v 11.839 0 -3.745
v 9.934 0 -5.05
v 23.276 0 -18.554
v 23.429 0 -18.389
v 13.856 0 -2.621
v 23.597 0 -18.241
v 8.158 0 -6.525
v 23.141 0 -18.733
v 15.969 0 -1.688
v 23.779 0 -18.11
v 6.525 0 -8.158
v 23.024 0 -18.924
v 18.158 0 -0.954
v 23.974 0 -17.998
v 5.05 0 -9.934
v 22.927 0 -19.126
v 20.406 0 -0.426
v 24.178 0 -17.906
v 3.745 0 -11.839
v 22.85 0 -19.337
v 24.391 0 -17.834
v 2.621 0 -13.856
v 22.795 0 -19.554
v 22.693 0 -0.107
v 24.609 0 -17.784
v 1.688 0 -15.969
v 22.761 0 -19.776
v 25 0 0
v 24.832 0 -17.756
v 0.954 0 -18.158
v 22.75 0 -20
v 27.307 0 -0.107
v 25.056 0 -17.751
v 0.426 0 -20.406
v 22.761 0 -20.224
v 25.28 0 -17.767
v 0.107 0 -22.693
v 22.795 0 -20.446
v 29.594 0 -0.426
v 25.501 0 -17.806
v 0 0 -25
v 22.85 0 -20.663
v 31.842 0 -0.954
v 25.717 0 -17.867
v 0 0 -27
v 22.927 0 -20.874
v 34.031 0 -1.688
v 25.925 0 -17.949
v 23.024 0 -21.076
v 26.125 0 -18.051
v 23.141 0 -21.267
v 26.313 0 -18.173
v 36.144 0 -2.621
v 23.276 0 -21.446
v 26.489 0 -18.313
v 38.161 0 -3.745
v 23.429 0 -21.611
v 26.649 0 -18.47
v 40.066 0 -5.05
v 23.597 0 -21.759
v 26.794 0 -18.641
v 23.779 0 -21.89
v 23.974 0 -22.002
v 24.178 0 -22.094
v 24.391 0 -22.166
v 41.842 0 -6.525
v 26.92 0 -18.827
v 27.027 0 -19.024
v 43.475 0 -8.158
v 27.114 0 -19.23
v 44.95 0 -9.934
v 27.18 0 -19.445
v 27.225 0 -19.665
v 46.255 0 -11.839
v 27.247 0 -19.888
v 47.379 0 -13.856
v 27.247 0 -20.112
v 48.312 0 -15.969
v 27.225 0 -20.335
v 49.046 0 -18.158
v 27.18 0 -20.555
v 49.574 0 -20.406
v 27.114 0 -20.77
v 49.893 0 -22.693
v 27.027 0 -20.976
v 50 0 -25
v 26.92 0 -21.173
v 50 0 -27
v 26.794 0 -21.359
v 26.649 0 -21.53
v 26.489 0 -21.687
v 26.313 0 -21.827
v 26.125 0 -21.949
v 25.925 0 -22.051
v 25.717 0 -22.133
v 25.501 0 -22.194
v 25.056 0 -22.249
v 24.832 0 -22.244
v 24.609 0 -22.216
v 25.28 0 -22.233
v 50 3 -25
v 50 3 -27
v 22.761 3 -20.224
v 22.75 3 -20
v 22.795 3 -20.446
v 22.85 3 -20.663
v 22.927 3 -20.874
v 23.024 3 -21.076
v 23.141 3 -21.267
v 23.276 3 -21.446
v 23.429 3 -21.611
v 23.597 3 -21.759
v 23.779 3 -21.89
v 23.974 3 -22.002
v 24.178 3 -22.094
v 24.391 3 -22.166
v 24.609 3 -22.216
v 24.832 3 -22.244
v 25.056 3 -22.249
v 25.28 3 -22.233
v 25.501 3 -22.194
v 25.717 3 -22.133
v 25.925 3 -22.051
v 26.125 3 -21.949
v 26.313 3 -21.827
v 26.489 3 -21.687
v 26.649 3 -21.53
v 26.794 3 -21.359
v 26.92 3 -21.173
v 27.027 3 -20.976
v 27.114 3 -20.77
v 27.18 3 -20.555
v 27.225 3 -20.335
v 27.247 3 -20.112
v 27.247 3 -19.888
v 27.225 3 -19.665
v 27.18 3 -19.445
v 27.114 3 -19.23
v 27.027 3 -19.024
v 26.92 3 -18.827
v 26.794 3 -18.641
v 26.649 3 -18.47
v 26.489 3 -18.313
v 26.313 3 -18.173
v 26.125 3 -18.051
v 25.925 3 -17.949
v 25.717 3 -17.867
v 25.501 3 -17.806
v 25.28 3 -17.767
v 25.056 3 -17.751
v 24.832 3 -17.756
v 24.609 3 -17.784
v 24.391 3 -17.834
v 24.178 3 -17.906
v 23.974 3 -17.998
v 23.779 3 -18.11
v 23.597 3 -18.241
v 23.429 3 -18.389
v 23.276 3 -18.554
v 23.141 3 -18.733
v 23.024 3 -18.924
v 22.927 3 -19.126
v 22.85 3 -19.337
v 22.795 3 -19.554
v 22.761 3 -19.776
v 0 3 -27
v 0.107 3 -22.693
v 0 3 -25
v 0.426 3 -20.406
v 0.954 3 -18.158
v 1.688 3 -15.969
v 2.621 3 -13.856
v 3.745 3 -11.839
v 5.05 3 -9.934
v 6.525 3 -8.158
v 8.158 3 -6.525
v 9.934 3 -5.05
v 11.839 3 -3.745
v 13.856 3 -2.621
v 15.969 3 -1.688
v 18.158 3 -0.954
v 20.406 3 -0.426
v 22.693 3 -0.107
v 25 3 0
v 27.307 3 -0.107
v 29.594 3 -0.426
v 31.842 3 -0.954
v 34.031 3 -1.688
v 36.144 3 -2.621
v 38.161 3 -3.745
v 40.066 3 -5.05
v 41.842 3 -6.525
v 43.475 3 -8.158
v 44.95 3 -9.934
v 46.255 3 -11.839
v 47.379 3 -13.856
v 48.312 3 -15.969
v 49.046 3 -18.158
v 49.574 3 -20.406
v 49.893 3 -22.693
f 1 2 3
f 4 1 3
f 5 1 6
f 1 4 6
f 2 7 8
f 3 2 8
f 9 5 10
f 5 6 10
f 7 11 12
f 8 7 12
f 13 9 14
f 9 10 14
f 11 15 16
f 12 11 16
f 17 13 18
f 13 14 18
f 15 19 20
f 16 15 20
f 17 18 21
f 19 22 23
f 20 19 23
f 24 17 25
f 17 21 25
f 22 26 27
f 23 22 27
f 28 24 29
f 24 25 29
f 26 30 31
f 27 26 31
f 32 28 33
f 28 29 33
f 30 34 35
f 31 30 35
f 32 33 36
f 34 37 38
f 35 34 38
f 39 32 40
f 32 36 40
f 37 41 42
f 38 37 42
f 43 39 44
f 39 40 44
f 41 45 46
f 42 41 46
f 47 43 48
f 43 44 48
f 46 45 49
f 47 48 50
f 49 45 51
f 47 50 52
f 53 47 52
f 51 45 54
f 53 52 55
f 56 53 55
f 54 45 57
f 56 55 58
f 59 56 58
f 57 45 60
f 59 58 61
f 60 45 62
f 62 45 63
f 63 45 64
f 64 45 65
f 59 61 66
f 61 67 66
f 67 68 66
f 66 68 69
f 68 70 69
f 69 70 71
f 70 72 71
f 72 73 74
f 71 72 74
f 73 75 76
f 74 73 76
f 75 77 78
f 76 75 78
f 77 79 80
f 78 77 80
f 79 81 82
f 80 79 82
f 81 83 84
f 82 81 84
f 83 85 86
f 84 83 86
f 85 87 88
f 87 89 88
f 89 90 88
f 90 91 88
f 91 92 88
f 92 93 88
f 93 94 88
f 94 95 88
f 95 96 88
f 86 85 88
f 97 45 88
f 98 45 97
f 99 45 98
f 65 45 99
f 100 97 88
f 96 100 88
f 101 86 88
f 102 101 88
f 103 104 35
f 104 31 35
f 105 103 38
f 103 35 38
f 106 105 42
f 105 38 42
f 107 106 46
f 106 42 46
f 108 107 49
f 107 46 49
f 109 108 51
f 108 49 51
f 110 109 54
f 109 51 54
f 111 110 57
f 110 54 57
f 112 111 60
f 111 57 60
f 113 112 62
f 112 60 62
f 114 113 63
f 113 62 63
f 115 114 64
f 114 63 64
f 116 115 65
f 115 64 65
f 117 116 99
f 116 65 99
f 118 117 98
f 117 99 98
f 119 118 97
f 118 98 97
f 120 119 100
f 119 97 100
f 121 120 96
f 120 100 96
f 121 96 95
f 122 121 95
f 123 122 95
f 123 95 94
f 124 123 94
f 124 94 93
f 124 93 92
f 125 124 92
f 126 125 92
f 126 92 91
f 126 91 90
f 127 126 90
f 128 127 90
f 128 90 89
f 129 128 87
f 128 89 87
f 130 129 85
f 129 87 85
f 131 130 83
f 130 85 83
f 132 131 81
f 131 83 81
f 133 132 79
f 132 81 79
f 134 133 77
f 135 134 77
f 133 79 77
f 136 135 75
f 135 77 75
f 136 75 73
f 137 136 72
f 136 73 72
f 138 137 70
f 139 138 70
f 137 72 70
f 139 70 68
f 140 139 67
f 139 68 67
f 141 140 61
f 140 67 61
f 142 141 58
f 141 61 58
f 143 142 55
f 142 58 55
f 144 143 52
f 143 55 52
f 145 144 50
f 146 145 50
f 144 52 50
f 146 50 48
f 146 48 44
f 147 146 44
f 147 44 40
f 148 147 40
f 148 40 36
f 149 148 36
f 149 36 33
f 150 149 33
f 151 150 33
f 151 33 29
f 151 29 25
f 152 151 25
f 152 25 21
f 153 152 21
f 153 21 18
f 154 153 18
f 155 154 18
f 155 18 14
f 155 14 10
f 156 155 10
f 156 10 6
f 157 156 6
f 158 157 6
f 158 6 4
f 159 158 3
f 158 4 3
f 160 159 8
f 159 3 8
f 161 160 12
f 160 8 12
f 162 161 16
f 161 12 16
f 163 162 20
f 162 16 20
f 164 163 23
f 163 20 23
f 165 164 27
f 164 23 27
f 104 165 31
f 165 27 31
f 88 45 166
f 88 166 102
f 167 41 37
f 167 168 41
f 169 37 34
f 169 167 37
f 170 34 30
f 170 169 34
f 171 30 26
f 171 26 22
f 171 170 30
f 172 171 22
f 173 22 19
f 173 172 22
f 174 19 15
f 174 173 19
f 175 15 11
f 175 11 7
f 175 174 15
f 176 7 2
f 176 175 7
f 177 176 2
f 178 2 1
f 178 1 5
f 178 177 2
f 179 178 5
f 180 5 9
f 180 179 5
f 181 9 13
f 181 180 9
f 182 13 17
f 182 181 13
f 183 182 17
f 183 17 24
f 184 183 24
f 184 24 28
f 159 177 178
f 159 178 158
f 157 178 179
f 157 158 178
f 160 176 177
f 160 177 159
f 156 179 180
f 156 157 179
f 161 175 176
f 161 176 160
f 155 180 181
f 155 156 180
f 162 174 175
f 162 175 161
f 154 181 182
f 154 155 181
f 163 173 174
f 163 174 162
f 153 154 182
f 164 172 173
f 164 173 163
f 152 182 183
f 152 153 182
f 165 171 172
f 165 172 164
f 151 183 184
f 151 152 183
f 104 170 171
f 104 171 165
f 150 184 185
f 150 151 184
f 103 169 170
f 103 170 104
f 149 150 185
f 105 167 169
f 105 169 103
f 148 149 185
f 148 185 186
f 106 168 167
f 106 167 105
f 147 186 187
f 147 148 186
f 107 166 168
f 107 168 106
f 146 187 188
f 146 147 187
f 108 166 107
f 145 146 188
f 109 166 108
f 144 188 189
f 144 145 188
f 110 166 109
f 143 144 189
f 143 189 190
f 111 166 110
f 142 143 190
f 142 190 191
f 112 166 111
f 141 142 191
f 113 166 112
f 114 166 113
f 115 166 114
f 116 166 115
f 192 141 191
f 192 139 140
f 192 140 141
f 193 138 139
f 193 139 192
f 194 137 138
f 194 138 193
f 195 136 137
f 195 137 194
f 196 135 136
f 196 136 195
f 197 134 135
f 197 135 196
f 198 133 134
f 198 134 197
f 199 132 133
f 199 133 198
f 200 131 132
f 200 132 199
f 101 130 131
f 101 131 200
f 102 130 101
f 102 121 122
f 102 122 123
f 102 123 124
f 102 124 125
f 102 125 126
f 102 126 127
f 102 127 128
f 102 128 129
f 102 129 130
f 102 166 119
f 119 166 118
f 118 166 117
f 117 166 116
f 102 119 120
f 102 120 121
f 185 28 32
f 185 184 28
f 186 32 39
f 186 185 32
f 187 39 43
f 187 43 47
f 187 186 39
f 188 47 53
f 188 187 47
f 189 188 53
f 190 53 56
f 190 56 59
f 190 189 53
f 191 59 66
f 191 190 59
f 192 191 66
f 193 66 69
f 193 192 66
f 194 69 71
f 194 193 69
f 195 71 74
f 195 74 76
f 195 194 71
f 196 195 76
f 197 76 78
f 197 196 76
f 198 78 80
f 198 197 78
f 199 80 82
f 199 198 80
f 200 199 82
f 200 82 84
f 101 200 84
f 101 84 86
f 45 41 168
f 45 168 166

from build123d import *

# Parameters (mm, degrees)
SKETCH1_W                = 50
SKETCH1_H                = 27
BOSS_EXTRUDE1_DEPTH      = 3
FILLET1_R                = 25
M4_CLEARANCE_HOLE2_D     = 4.5
M4_CLEARANCE_HOLE2_DEPTH = 3
M4_CLEARANCE_HOLE2_TIP   = 1.351936393


with BuildPart() as part:
    # Sketch1 → Boss-Extrude1 (new body)
    with BuildSketch(Plane(origin=(0, 0, 0), x_dir=(1, 0, 0), z_dir=(0, 1, 0))):
        with Locations((25, 13.5)):
            Rectangle(SKETCH1_W, SKETCH1_H)
    extrude(amount=BOSS_EXTRUDE1_DEPTH)

    # Fillet1
    fillet1_edges = [part.edges().sort_by_distance(p)[0] for p in [
        (50, 1.5, 0),
        (0, 1.5, 0),
    ]]
    fillet(fillet1_edges, radius=FILLET1_R - 0.0001)  # a hair under: the kernel refuses the full size

    # M4 Clearance Hole2
    with Locations(Plane(origin=(0, 3, 0), x_dir=(1, 0, 0), z_dir=(0, 1, 0))):
        with Locations((25, 20)):
            Hole(M4_CLEARANCE_HOLE2_D / 2, depth=M4_CLEARANCE_HOLE2_DEPTH)
            with Locations((0, 0, -(M4_CLEARANCE_HOLE2_DEPTH + M4_CLEARANCE_HOLE2_TIP / 2))):  # 118° drill point
                Cone(0, M4_CLEARANCE_HOLE2_D / 2, M4_CLEARANCE_HOLE2_TIP, mode=Mode.SUBTRACT)


solid = part.part
